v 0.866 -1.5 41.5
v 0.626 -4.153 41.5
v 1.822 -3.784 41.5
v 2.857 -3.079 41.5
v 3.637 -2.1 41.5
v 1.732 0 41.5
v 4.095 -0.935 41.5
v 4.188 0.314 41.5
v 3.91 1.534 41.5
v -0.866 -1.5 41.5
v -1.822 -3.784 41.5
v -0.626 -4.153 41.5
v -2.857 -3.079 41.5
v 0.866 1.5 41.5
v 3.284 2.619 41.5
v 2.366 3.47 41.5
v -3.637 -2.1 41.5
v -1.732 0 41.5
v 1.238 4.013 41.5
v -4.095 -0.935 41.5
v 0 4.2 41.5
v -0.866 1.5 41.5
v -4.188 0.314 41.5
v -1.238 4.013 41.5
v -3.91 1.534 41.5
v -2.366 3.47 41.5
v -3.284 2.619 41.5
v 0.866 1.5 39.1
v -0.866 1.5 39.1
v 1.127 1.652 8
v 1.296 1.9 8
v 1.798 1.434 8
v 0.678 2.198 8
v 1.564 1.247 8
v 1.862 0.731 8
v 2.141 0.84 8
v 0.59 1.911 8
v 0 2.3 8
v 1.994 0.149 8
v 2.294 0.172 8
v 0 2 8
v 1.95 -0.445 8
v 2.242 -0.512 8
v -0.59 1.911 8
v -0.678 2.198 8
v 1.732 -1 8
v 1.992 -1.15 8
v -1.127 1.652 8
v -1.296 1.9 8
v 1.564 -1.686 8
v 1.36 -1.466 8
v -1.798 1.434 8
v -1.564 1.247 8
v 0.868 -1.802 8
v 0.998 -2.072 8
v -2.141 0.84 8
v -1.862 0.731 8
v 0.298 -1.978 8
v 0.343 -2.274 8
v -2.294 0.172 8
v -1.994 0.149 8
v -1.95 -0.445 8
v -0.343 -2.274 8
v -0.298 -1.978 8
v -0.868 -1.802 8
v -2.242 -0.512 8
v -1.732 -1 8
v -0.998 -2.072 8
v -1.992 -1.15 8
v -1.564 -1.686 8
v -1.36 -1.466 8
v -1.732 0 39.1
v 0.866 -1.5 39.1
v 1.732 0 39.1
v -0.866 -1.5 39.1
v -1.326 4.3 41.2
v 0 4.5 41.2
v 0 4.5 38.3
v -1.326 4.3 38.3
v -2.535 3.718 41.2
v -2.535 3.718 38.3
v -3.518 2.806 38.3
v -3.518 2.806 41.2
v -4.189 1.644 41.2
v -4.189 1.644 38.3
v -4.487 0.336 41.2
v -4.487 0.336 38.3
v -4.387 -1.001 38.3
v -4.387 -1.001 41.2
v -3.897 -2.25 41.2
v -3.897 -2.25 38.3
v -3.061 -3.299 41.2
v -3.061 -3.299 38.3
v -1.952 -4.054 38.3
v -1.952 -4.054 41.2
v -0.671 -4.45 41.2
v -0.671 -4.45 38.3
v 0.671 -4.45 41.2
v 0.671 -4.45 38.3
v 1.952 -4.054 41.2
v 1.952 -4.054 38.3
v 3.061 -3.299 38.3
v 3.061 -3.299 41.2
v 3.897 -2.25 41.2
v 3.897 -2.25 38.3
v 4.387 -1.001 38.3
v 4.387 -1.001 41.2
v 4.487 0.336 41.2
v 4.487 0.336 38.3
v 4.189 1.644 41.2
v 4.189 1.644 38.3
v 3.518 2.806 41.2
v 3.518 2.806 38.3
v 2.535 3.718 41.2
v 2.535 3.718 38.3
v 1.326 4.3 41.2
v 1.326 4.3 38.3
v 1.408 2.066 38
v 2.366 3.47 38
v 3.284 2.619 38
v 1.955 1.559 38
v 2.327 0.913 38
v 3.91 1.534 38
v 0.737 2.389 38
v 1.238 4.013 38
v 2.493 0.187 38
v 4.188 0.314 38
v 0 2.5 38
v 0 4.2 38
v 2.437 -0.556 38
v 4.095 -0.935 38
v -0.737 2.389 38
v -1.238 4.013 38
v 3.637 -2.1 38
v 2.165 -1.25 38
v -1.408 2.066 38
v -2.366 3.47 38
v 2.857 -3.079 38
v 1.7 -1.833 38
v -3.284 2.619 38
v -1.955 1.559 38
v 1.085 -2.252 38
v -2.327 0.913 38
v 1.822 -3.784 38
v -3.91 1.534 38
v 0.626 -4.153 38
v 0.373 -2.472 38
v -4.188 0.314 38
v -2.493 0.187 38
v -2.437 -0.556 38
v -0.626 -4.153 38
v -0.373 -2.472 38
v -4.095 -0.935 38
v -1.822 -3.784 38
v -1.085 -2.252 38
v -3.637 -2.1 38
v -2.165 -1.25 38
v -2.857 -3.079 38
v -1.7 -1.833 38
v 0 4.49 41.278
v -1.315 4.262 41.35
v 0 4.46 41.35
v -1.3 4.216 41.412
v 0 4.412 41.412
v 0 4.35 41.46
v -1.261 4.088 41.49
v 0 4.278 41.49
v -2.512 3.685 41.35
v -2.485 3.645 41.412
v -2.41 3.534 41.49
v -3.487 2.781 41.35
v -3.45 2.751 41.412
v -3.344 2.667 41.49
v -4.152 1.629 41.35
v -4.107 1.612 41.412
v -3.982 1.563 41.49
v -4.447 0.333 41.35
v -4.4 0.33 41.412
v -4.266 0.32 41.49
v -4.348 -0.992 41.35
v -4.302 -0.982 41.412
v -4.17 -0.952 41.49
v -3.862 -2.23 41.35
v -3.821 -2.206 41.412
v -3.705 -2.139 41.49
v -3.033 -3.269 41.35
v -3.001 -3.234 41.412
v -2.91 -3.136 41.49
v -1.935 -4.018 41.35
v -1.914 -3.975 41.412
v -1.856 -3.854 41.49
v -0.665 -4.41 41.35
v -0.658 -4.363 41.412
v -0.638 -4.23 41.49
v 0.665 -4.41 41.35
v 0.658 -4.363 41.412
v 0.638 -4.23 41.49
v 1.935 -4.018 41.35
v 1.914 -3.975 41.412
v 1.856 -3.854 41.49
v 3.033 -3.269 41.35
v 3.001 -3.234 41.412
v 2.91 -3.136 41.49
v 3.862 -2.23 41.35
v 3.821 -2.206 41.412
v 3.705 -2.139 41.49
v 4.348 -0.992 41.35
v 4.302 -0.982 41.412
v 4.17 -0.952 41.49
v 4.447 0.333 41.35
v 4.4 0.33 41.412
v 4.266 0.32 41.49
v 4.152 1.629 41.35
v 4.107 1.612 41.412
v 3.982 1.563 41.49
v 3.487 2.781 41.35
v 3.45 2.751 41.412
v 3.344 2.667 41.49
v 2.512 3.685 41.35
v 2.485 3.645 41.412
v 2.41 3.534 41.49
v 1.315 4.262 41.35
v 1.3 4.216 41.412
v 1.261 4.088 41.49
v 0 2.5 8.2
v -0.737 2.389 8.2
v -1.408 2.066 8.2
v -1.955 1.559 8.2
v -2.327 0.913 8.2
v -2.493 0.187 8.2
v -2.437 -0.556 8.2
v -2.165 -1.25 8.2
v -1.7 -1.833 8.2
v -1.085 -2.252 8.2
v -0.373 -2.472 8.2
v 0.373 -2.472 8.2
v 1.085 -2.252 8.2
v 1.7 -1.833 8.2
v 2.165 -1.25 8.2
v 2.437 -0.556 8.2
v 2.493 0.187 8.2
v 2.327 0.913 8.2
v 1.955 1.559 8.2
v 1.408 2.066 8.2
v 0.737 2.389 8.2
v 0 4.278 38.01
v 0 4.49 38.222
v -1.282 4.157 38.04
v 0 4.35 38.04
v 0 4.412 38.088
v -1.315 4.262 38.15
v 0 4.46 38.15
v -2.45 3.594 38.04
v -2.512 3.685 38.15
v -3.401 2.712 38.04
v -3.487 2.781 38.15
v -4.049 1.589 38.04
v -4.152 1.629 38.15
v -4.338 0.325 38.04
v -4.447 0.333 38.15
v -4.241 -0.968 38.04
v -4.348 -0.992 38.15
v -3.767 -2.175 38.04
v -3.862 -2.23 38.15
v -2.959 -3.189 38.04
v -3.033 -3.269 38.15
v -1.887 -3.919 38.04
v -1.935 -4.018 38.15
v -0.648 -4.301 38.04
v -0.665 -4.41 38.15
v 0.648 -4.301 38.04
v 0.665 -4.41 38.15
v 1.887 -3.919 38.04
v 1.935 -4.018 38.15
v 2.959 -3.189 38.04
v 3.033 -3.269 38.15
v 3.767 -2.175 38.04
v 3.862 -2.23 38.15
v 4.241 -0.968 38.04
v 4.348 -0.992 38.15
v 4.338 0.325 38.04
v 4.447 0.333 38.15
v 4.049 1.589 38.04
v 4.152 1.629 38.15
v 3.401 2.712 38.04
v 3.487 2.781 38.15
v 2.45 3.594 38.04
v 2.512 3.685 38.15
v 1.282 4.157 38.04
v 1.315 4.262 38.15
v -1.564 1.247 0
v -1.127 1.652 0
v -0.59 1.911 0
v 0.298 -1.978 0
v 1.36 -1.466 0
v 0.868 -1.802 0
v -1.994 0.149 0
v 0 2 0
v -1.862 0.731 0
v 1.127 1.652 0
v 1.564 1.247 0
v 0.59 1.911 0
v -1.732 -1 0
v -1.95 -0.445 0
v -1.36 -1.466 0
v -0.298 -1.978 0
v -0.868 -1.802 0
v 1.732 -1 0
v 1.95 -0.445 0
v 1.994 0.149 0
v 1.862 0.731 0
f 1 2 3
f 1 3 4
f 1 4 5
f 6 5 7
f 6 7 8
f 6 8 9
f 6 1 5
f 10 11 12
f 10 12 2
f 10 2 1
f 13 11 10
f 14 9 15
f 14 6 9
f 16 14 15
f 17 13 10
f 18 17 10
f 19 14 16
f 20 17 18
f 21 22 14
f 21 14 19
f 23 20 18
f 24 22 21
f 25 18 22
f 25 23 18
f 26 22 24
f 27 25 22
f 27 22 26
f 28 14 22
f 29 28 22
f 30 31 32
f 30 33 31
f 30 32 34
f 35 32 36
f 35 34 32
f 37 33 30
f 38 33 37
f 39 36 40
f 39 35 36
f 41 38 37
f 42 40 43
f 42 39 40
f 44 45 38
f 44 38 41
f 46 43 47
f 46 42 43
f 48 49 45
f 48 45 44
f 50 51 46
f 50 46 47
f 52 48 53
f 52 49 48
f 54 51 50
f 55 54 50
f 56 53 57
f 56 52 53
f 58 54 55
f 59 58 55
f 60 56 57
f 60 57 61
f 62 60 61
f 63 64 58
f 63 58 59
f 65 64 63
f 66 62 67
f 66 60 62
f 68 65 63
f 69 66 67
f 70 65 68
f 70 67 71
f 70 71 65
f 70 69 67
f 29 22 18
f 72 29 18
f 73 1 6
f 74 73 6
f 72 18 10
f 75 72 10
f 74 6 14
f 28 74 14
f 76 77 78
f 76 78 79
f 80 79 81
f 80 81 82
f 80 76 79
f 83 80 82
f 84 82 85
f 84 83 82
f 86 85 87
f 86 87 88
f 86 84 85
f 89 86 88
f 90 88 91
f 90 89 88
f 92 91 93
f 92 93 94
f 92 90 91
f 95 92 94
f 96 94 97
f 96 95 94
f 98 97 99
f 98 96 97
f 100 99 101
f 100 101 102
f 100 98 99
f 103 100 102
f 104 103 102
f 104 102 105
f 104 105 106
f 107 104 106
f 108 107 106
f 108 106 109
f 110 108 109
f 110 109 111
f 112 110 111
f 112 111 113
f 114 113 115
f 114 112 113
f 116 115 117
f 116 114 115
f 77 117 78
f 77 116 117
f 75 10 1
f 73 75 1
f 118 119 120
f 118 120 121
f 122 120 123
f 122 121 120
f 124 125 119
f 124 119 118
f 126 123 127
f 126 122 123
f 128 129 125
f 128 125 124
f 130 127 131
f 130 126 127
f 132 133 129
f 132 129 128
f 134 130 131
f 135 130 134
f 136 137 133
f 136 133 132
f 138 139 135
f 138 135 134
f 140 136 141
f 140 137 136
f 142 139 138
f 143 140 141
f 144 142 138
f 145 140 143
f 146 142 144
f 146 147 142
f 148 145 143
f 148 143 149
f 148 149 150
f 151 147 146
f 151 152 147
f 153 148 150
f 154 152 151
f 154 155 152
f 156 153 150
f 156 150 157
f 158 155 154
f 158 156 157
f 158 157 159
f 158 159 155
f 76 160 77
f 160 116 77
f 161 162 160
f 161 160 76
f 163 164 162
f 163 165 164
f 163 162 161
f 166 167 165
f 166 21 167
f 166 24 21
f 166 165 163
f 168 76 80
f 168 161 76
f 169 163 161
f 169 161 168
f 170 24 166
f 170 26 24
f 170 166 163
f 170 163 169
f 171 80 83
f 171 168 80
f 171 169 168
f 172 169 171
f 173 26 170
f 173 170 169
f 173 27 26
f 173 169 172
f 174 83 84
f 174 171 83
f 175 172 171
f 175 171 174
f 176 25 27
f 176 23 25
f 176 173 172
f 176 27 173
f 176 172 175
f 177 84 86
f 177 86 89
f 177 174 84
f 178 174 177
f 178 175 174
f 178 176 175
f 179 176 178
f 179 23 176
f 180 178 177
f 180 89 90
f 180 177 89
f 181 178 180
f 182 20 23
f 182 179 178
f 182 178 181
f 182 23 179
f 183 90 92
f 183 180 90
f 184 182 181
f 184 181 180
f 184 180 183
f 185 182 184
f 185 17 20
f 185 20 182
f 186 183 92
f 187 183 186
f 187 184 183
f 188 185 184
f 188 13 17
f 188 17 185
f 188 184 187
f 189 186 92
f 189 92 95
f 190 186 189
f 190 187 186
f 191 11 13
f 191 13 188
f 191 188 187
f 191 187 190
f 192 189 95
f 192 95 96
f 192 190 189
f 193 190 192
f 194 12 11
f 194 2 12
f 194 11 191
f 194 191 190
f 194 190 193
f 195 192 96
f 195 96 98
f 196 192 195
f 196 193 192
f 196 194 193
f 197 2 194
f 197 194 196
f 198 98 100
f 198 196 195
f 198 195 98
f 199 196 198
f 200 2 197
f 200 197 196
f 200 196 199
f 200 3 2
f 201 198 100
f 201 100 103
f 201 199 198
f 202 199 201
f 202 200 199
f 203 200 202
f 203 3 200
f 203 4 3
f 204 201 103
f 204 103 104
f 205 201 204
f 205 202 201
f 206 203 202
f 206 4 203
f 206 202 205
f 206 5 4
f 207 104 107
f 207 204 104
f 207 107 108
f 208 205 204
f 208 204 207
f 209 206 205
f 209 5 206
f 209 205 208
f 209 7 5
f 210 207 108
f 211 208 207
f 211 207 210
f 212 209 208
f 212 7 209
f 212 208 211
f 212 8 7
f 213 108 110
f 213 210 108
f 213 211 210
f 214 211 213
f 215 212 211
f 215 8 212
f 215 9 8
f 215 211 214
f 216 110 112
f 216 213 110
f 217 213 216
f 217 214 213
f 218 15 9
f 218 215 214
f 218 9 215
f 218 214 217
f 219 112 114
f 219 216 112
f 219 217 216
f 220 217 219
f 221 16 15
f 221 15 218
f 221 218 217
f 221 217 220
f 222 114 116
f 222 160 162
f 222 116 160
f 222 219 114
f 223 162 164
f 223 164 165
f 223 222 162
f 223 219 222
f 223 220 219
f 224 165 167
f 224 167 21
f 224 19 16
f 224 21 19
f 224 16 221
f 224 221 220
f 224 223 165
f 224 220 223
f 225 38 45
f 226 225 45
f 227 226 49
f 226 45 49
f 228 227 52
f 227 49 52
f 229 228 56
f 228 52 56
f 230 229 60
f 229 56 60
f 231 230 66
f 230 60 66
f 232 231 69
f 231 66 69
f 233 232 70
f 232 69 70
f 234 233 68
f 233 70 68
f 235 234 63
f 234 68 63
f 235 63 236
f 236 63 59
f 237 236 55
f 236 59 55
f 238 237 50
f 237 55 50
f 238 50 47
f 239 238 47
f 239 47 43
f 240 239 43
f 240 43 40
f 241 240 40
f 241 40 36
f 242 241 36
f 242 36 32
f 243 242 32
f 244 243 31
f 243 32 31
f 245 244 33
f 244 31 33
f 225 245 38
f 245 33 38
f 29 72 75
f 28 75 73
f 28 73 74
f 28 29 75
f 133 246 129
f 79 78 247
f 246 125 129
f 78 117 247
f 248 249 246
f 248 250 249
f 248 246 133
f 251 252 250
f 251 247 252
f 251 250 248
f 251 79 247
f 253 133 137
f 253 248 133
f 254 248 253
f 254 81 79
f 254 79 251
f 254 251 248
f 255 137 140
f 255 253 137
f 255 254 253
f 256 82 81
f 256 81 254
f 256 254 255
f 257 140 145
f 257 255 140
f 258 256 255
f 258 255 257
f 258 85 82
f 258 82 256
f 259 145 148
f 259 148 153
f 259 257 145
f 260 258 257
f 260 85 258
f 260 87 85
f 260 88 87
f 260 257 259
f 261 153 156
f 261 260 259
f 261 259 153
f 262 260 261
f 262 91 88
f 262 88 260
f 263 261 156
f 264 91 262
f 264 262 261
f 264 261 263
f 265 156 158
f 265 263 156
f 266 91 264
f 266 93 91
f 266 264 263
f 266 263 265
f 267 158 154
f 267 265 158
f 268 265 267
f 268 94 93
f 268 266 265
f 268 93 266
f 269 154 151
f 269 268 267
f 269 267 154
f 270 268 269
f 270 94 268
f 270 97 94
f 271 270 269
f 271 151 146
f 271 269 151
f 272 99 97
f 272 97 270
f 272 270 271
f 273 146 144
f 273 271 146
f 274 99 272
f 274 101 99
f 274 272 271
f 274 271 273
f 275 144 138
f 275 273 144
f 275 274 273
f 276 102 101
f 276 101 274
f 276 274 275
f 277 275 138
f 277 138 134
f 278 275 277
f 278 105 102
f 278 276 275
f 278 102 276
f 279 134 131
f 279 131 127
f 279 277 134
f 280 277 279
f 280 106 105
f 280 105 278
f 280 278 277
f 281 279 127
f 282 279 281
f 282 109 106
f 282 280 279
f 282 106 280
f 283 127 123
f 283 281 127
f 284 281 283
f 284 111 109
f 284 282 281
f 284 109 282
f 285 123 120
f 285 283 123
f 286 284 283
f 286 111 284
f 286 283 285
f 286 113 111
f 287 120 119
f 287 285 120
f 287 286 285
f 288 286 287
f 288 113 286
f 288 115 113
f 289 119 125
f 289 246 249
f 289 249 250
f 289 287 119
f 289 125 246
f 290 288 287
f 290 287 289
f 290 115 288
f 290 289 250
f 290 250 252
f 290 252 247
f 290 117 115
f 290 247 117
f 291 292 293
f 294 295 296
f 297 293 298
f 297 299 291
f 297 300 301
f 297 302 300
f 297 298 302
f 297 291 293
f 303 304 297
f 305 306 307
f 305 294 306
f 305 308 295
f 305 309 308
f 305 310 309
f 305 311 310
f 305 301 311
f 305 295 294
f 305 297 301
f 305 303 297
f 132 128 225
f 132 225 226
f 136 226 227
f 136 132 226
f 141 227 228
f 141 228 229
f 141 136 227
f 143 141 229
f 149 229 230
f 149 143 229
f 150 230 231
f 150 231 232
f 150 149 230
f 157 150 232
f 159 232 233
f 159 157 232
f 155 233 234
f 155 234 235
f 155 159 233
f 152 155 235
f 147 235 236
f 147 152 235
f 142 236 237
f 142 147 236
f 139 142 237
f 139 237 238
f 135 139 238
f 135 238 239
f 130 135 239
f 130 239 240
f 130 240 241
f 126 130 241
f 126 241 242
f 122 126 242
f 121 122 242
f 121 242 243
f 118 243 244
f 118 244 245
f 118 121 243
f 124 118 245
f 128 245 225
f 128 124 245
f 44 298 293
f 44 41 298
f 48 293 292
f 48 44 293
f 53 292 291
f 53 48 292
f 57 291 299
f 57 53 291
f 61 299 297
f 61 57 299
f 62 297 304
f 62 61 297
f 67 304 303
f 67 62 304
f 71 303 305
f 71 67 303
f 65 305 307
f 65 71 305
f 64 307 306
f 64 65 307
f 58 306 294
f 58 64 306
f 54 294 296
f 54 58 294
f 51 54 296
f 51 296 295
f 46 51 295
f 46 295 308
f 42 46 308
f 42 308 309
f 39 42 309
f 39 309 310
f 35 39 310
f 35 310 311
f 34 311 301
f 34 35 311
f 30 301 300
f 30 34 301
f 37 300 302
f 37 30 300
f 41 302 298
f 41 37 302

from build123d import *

# Parameters (mm, degrees)
FILLET_1_R          = 0.3
CUT_EXTRUDE_1_DEPTH = 2.4
CHAMFER_1_SIZE      = 0.2


with BuildPart() as part:
    # 草图1 → 旋转1 (revolve)
    with BuildSketch(Plane(origin=(0, 0, 0), x_dir=(0, 0, -1), z_dir=(1, 0, 0))):
        Polygon((0, 0), (0, 2), (-8, 2), (-8, 2.5), (-38, 2.5), (-38, 4.5), (-41.5, 4.5), (-41.5, 0), align=None)
    revolve(axis=Axis((0, 0, 0), (0, 0, 1)))

    # 圆角1
    fillet_1_edges = [part.edges().sort_by_distance(p)[0] for p in [
        (0, -4.5, 41.5),
        (0, -4.5, 38),
    ]]
    fillet(fillet_1_edges, radius=FILLET_1_R)

    # 草图2 → 切除-拉伸1 (cut)
    with BuildSketch(Plane.XY.offset(41.5)):
        Polygon((1.732050808, 0), (0.866025404, 1.5), (-0.866025404, 1.5), (-1.732050808, 0), (-0.866025404, -1.5), (0.866025404, -1.5), align=None)
    extrude(amount=-CUT_EXTRUDE_1_DEPTH, mode=Mode.SUBTRACT)

    # 倒角1
    chamfer_1_edges = [part.edges().sort_by_distance(p)[0] for p in [
        (0, -2.5, 8),
    ]]
    chamfer(chamfer_1_edges, length=CHAMFER_1_SIZE)


solid = part.part
